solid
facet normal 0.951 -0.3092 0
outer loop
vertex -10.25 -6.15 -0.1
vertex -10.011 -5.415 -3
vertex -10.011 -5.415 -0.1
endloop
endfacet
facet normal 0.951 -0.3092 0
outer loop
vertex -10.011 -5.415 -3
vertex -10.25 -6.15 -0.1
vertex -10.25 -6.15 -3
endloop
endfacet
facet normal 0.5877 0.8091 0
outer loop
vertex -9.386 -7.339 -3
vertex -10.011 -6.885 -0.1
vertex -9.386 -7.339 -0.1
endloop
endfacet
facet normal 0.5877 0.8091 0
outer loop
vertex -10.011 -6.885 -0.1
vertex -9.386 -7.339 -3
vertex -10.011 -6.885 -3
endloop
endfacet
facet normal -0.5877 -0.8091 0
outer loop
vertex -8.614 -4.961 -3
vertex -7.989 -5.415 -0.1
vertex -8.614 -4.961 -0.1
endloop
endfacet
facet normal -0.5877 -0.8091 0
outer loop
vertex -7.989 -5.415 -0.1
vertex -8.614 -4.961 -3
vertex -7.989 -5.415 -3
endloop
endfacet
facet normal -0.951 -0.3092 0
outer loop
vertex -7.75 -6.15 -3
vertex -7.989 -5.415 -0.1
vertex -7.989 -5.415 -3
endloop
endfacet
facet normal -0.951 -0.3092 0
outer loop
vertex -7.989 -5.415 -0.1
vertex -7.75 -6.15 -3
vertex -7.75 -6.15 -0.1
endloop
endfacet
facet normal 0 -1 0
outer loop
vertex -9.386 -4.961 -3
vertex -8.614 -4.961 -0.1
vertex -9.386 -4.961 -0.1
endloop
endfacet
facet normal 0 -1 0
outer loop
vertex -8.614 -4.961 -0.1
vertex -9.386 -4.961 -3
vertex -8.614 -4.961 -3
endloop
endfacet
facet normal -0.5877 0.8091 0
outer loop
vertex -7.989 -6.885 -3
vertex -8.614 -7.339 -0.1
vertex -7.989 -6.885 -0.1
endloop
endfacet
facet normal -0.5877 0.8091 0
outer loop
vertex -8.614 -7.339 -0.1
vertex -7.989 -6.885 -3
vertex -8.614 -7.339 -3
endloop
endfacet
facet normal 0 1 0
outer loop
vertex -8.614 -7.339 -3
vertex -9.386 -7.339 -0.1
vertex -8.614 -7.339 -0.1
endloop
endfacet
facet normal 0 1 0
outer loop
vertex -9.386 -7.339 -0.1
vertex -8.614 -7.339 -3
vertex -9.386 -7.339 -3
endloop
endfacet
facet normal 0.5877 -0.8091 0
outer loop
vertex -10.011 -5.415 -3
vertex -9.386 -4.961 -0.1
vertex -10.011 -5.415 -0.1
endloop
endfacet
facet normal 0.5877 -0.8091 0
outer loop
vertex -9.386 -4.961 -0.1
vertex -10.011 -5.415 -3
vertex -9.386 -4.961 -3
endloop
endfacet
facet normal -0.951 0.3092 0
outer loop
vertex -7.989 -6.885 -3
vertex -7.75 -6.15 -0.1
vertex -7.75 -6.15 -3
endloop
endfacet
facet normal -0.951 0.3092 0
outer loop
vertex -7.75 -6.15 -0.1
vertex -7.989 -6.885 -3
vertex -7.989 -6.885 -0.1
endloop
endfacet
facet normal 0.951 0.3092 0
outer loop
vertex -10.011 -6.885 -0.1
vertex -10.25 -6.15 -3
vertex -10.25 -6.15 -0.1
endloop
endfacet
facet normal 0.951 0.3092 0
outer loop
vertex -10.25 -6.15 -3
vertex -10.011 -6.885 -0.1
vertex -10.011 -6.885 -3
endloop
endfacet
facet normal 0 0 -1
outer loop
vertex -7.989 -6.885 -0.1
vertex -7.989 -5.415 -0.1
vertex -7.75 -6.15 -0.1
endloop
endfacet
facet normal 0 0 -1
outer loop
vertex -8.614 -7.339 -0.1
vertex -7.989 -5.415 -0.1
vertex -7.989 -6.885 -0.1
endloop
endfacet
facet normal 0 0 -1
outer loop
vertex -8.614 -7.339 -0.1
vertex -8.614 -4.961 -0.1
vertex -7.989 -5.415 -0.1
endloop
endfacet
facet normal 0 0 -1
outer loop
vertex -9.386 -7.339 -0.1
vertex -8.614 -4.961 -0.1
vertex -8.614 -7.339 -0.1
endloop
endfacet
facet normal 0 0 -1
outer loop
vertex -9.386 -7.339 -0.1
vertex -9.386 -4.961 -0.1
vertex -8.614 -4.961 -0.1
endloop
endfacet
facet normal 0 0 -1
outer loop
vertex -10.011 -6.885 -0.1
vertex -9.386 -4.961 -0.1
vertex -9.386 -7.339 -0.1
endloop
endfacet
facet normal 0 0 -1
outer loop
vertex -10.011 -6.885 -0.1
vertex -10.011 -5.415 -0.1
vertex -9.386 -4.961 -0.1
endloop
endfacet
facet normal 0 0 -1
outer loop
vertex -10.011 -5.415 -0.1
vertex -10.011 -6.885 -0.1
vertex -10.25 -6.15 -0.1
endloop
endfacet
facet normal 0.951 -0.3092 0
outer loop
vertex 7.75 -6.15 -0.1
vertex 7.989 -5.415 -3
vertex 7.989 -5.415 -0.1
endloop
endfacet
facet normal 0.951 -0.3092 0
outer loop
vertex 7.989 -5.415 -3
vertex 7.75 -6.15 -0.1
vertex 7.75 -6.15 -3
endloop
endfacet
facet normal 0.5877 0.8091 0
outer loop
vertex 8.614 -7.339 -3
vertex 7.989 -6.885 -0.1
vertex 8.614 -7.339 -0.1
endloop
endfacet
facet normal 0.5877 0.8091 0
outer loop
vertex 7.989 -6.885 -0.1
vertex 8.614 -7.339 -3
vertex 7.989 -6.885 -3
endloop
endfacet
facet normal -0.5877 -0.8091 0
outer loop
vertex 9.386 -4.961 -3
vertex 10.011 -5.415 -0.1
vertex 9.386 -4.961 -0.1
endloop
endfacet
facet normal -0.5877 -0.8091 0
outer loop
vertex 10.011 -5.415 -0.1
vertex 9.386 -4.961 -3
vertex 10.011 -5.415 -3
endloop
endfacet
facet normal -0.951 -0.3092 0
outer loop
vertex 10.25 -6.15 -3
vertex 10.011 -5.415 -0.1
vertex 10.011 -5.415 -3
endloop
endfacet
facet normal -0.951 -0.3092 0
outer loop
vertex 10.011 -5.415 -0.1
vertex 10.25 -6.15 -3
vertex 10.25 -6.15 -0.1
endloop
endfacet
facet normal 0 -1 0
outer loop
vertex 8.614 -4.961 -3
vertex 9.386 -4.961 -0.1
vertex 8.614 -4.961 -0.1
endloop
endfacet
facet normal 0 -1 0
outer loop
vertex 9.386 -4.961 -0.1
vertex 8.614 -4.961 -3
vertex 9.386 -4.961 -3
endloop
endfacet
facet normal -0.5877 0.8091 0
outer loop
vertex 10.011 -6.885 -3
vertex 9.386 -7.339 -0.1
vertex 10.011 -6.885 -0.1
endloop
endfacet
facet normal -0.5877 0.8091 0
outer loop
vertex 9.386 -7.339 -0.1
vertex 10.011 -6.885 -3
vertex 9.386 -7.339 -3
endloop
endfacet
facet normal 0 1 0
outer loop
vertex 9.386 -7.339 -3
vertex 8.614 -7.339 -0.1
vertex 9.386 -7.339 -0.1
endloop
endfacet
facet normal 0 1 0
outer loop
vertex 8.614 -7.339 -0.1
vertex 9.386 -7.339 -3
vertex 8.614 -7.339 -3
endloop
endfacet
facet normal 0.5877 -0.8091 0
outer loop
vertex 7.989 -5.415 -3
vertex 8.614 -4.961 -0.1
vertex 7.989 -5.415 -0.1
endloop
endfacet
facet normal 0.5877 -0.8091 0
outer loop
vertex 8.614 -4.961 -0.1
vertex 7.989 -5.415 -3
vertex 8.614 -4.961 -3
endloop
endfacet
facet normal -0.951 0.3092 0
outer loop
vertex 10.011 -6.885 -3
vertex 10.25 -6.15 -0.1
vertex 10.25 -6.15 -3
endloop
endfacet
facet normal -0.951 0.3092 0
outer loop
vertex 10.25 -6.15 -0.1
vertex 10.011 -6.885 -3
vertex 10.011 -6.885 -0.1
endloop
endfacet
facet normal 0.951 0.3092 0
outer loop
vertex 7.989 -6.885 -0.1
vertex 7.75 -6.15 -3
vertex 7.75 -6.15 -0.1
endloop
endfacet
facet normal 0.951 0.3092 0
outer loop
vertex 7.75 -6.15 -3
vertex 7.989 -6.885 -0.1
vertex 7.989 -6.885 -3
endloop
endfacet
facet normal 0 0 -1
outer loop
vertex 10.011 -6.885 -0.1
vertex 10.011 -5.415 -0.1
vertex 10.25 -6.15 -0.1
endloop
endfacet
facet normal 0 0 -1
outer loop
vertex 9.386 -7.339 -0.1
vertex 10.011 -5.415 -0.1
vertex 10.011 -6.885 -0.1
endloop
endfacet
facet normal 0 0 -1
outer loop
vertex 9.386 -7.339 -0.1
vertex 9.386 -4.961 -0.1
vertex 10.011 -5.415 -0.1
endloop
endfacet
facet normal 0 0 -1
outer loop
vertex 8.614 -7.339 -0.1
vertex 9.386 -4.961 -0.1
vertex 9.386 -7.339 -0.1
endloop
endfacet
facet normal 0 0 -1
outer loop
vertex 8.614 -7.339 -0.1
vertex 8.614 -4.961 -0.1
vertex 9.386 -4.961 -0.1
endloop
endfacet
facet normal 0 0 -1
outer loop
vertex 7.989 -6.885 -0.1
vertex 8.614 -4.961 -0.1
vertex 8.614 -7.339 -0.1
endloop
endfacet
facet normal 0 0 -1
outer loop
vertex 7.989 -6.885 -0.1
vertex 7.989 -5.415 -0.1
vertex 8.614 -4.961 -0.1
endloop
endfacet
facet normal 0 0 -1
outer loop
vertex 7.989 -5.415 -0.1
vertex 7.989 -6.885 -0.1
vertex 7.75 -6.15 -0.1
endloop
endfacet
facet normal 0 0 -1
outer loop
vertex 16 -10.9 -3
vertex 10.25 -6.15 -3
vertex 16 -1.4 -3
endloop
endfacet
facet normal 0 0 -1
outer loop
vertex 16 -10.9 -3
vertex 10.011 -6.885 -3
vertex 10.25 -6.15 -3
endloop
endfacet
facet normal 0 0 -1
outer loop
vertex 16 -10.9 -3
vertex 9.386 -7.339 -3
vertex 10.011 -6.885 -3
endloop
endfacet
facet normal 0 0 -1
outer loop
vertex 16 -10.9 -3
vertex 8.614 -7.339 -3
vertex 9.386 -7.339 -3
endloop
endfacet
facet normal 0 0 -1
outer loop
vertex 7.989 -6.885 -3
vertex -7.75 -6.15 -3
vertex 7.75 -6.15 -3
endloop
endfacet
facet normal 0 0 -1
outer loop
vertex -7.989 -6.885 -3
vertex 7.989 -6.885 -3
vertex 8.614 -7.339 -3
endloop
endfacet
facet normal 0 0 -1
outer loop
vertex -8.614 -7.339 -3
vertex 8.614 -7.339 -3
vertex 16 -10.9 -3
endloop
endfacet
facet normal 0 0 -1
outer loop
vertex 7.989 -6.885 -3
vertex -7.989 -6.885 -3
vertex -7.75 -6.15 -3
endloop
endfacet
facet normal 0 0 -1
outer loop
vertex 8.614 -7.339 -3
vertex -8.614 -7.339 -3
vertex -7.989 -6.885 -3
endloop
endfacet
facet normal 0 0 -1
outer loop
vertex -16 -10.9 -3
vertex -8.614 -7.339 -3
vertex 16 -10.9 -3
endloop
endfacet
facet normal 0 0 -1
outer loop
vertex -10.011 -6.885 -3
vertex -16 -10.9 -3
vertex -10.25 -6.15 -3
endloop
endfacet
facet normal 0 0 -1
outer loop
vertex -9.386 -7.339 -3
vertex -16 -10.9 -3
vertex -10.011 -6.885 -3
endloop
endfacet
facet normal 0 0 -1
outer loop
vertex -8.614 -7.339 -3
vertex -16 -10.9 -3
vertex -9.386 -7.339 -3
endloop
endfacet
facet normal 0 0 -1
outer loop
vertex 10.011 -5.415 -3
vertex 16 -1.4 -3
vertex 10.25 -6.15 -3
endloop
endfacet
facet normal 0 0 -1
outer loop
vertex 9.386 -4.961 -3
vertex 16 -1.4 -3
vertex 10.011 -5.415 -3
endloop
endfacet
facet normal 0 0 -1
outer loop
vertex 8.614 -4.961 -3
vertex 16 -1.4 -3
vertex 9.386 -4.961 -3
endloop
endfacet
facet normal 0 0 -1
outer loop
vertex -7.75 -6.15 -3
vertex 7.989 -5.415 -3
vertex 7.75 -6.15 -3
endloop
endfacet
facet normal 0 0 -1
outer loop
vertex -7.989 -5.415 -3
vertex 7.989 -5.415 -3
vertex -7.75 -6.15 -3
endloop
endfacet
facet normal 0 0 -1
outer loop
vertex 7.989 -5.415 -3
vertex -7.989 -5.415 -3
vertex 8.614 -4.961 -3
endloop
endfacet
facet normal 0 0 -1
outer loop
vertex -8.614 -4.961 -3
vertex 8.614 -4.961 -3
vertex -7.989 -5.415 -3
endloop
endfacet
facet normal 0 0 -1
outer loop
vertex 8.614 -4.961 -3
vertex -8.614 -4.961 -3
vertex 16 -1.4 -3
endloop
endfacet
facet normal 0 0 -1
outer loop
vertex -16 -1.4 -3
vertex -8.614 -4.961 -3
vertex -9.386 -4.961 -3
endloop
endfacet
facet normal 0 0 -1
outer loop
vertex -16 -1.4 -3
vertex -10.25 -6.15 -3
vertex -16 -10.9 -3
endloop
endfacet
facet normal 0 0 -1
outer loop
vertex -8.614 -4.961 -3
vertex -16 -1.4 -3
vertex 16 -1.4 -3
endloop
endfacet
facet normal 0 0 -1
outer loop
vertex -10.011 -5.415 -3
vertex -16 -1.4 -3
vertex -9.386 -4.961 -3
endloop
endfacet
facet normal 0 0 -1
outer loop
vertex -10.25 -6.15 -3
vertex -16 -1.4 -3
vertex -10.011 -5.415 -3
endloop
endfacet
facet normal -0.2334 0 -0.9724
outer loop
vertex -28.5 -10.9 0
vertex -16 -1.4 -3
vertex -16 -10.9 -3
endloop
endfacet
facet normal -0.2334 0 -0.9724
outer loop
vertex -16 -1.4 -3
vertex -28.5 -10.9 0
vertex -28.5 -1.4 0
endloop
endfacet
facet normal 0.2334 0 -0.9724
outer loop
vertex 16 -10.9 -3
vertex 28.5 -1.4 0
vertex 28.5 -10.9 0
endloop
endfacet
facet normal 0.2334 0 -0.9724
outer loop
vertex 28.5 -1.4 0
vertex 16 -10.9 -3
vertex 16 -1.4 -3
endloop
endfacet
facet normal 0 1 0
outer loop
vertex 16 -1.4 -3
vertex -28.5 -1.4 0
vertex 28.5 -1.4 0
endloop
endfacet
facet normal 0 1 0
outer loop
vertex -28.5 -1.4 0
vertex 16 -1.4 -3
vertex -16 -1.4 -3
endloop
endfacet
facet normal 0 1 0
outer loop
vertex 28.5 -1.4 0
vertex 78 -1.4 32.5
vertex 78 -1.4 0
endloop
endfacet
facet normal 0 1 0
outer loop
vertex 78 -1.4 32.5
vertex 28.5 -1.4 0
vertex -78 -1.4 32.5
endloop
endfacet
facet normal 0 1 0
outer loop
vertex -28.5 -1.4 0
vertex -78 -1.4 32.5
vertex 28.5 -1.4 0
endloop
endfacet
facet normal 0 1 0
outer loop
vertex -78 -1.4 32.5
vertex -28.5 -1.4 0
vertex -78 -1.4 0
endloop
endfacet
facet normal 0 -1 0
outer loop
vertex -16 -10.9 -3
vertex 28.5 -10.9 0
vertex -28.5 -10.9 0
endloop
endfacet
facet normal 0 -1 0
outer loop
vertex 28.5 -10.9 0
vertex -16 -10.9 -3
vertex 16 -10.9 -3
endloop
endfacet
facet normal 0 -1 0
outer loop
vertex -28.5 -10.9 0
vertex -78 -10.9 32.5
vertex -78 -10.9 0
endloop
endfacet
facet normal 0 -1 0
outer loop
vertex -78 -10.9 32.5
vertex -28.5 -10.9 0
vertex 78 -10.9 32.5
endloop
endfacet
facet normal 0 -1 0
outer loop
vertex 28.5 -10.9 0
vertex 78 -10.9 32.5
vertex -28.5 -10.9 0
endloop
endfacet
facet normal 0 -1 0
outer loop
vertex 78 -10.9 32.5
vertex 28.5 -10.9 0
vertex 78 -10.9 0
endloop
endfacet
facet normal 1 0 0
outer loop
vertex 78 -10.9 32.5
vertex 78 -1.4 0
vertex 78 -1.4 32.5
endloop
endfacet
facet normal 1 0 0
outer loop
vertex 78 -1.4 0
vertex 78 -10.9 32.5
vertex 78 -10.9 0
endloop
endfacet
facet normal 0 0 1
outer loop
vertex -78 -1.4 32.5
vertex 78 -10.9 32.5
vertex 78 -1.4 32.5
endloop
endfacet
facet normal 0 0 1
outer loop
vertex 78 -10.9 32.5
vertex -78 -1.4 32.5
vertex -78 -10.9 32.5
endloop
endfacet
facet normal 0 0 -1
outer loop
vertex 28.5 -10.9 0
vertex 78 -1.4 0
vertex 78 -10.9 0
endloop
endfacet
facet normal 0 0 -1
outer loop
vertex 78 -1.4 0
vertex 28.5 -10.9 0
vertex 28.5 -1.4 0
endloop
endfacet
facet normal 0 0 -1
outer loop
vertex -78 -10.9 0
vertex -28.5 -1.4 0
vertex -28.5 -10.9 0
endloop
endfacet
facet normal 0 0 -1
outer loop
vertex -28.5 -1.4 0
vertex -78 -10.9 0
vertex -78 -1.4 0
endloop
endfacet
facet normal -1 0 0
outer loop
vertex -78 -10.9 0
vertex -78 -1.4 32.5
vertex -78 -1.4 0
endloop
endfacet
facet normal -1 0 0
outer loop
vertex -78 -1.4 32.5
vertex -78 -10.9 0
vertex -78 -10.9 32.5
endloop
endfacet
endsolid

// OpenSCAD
// Basic Model of Intel(R) RealSense(TM) ZR300 Depth Camera
//   also includes cutting plan for basic mounting
// Developed b0y: Michael McCool
// Copyright 2016 Intel Corporation
// License: CC-BY.  See LICENSE.md

// All units in mm unless noted otherwise.

sm_base = 10;  // "smoothness" of curves; larger->smoother
mount_hole_sm = sm_base;
m2_5_hole_radius = 2.5/2;

// CAMERA PARAMETERS

// basic overall size of camera
zr300_x = 156;
zr300_y = 9.5;
zr300_z = 32.5;

// base of camera
zr300_base_x1 = 32;
zr300_base_x2 = 57;
zr300_base_z = 3;
zr300_base_h = 18; // separation of mounting holes
zr300_base_r = m2_5_hole_radius;

// thickness of magnetic mounting plate and tape
zr300_plate_thick = 1.4;

// CAMERA MOUNT PARAMETERS

// defaults 
zr300_mount_hole_t = 0.2;  // tolerance of mounting hole
zr300_mount_slot_t = 0.0;  // tolerance of mounting slot

// ZR300 Camera Model (3D)
module zr300_camera() {
  color([0.1,0.1,0.7,0.9])
  translate([-zr300_x/2,-zr300_y-zr300_plate_thick,0]) {
    cube([zr300_x,zr300_y,zr300_z]);
    difference() {
      hull() {
        translate([zr300_x/2-zr300_base_x2/2,0,0])
          cube([zr300_base_x2,zr300_y,0.1]);
        translate([zr300_x/2-zr300_base_x1/2,0,-zr300_base_z])
          cube([zr300_base_x1,zr300_y,0.1]);
      }
      translate([0,zr300_y/2,-zr300_base_z-0.1]) {
        translate([zr300_x/2-zr300_base_h/2,0,0])
          cylinder(r=zr300_base_r,h=zr300_base_z,$fn=mount_hole_sm);
        translate([zr300_x/2+zr300_base_h/2,0,0])
          cylinder(r=zr300_base_r,h=zr300_base_z,$fn=mount_hole_sm);
      }
    }
  }
}

// ZR300 Camera Mount Slot (2D)
module zr300_camera_mounting_holes(
  hole_t = zr300_mount_hole_t,
  slot_t = zr300_mount_slot_t
) {
}

// VISUALIZATION
zr300_camera();
translate([0,zr300_y+3.5,0])
  rotate([90,0,0])
    linear_extrude(3)
      zr300_camera_mounting_holes();
